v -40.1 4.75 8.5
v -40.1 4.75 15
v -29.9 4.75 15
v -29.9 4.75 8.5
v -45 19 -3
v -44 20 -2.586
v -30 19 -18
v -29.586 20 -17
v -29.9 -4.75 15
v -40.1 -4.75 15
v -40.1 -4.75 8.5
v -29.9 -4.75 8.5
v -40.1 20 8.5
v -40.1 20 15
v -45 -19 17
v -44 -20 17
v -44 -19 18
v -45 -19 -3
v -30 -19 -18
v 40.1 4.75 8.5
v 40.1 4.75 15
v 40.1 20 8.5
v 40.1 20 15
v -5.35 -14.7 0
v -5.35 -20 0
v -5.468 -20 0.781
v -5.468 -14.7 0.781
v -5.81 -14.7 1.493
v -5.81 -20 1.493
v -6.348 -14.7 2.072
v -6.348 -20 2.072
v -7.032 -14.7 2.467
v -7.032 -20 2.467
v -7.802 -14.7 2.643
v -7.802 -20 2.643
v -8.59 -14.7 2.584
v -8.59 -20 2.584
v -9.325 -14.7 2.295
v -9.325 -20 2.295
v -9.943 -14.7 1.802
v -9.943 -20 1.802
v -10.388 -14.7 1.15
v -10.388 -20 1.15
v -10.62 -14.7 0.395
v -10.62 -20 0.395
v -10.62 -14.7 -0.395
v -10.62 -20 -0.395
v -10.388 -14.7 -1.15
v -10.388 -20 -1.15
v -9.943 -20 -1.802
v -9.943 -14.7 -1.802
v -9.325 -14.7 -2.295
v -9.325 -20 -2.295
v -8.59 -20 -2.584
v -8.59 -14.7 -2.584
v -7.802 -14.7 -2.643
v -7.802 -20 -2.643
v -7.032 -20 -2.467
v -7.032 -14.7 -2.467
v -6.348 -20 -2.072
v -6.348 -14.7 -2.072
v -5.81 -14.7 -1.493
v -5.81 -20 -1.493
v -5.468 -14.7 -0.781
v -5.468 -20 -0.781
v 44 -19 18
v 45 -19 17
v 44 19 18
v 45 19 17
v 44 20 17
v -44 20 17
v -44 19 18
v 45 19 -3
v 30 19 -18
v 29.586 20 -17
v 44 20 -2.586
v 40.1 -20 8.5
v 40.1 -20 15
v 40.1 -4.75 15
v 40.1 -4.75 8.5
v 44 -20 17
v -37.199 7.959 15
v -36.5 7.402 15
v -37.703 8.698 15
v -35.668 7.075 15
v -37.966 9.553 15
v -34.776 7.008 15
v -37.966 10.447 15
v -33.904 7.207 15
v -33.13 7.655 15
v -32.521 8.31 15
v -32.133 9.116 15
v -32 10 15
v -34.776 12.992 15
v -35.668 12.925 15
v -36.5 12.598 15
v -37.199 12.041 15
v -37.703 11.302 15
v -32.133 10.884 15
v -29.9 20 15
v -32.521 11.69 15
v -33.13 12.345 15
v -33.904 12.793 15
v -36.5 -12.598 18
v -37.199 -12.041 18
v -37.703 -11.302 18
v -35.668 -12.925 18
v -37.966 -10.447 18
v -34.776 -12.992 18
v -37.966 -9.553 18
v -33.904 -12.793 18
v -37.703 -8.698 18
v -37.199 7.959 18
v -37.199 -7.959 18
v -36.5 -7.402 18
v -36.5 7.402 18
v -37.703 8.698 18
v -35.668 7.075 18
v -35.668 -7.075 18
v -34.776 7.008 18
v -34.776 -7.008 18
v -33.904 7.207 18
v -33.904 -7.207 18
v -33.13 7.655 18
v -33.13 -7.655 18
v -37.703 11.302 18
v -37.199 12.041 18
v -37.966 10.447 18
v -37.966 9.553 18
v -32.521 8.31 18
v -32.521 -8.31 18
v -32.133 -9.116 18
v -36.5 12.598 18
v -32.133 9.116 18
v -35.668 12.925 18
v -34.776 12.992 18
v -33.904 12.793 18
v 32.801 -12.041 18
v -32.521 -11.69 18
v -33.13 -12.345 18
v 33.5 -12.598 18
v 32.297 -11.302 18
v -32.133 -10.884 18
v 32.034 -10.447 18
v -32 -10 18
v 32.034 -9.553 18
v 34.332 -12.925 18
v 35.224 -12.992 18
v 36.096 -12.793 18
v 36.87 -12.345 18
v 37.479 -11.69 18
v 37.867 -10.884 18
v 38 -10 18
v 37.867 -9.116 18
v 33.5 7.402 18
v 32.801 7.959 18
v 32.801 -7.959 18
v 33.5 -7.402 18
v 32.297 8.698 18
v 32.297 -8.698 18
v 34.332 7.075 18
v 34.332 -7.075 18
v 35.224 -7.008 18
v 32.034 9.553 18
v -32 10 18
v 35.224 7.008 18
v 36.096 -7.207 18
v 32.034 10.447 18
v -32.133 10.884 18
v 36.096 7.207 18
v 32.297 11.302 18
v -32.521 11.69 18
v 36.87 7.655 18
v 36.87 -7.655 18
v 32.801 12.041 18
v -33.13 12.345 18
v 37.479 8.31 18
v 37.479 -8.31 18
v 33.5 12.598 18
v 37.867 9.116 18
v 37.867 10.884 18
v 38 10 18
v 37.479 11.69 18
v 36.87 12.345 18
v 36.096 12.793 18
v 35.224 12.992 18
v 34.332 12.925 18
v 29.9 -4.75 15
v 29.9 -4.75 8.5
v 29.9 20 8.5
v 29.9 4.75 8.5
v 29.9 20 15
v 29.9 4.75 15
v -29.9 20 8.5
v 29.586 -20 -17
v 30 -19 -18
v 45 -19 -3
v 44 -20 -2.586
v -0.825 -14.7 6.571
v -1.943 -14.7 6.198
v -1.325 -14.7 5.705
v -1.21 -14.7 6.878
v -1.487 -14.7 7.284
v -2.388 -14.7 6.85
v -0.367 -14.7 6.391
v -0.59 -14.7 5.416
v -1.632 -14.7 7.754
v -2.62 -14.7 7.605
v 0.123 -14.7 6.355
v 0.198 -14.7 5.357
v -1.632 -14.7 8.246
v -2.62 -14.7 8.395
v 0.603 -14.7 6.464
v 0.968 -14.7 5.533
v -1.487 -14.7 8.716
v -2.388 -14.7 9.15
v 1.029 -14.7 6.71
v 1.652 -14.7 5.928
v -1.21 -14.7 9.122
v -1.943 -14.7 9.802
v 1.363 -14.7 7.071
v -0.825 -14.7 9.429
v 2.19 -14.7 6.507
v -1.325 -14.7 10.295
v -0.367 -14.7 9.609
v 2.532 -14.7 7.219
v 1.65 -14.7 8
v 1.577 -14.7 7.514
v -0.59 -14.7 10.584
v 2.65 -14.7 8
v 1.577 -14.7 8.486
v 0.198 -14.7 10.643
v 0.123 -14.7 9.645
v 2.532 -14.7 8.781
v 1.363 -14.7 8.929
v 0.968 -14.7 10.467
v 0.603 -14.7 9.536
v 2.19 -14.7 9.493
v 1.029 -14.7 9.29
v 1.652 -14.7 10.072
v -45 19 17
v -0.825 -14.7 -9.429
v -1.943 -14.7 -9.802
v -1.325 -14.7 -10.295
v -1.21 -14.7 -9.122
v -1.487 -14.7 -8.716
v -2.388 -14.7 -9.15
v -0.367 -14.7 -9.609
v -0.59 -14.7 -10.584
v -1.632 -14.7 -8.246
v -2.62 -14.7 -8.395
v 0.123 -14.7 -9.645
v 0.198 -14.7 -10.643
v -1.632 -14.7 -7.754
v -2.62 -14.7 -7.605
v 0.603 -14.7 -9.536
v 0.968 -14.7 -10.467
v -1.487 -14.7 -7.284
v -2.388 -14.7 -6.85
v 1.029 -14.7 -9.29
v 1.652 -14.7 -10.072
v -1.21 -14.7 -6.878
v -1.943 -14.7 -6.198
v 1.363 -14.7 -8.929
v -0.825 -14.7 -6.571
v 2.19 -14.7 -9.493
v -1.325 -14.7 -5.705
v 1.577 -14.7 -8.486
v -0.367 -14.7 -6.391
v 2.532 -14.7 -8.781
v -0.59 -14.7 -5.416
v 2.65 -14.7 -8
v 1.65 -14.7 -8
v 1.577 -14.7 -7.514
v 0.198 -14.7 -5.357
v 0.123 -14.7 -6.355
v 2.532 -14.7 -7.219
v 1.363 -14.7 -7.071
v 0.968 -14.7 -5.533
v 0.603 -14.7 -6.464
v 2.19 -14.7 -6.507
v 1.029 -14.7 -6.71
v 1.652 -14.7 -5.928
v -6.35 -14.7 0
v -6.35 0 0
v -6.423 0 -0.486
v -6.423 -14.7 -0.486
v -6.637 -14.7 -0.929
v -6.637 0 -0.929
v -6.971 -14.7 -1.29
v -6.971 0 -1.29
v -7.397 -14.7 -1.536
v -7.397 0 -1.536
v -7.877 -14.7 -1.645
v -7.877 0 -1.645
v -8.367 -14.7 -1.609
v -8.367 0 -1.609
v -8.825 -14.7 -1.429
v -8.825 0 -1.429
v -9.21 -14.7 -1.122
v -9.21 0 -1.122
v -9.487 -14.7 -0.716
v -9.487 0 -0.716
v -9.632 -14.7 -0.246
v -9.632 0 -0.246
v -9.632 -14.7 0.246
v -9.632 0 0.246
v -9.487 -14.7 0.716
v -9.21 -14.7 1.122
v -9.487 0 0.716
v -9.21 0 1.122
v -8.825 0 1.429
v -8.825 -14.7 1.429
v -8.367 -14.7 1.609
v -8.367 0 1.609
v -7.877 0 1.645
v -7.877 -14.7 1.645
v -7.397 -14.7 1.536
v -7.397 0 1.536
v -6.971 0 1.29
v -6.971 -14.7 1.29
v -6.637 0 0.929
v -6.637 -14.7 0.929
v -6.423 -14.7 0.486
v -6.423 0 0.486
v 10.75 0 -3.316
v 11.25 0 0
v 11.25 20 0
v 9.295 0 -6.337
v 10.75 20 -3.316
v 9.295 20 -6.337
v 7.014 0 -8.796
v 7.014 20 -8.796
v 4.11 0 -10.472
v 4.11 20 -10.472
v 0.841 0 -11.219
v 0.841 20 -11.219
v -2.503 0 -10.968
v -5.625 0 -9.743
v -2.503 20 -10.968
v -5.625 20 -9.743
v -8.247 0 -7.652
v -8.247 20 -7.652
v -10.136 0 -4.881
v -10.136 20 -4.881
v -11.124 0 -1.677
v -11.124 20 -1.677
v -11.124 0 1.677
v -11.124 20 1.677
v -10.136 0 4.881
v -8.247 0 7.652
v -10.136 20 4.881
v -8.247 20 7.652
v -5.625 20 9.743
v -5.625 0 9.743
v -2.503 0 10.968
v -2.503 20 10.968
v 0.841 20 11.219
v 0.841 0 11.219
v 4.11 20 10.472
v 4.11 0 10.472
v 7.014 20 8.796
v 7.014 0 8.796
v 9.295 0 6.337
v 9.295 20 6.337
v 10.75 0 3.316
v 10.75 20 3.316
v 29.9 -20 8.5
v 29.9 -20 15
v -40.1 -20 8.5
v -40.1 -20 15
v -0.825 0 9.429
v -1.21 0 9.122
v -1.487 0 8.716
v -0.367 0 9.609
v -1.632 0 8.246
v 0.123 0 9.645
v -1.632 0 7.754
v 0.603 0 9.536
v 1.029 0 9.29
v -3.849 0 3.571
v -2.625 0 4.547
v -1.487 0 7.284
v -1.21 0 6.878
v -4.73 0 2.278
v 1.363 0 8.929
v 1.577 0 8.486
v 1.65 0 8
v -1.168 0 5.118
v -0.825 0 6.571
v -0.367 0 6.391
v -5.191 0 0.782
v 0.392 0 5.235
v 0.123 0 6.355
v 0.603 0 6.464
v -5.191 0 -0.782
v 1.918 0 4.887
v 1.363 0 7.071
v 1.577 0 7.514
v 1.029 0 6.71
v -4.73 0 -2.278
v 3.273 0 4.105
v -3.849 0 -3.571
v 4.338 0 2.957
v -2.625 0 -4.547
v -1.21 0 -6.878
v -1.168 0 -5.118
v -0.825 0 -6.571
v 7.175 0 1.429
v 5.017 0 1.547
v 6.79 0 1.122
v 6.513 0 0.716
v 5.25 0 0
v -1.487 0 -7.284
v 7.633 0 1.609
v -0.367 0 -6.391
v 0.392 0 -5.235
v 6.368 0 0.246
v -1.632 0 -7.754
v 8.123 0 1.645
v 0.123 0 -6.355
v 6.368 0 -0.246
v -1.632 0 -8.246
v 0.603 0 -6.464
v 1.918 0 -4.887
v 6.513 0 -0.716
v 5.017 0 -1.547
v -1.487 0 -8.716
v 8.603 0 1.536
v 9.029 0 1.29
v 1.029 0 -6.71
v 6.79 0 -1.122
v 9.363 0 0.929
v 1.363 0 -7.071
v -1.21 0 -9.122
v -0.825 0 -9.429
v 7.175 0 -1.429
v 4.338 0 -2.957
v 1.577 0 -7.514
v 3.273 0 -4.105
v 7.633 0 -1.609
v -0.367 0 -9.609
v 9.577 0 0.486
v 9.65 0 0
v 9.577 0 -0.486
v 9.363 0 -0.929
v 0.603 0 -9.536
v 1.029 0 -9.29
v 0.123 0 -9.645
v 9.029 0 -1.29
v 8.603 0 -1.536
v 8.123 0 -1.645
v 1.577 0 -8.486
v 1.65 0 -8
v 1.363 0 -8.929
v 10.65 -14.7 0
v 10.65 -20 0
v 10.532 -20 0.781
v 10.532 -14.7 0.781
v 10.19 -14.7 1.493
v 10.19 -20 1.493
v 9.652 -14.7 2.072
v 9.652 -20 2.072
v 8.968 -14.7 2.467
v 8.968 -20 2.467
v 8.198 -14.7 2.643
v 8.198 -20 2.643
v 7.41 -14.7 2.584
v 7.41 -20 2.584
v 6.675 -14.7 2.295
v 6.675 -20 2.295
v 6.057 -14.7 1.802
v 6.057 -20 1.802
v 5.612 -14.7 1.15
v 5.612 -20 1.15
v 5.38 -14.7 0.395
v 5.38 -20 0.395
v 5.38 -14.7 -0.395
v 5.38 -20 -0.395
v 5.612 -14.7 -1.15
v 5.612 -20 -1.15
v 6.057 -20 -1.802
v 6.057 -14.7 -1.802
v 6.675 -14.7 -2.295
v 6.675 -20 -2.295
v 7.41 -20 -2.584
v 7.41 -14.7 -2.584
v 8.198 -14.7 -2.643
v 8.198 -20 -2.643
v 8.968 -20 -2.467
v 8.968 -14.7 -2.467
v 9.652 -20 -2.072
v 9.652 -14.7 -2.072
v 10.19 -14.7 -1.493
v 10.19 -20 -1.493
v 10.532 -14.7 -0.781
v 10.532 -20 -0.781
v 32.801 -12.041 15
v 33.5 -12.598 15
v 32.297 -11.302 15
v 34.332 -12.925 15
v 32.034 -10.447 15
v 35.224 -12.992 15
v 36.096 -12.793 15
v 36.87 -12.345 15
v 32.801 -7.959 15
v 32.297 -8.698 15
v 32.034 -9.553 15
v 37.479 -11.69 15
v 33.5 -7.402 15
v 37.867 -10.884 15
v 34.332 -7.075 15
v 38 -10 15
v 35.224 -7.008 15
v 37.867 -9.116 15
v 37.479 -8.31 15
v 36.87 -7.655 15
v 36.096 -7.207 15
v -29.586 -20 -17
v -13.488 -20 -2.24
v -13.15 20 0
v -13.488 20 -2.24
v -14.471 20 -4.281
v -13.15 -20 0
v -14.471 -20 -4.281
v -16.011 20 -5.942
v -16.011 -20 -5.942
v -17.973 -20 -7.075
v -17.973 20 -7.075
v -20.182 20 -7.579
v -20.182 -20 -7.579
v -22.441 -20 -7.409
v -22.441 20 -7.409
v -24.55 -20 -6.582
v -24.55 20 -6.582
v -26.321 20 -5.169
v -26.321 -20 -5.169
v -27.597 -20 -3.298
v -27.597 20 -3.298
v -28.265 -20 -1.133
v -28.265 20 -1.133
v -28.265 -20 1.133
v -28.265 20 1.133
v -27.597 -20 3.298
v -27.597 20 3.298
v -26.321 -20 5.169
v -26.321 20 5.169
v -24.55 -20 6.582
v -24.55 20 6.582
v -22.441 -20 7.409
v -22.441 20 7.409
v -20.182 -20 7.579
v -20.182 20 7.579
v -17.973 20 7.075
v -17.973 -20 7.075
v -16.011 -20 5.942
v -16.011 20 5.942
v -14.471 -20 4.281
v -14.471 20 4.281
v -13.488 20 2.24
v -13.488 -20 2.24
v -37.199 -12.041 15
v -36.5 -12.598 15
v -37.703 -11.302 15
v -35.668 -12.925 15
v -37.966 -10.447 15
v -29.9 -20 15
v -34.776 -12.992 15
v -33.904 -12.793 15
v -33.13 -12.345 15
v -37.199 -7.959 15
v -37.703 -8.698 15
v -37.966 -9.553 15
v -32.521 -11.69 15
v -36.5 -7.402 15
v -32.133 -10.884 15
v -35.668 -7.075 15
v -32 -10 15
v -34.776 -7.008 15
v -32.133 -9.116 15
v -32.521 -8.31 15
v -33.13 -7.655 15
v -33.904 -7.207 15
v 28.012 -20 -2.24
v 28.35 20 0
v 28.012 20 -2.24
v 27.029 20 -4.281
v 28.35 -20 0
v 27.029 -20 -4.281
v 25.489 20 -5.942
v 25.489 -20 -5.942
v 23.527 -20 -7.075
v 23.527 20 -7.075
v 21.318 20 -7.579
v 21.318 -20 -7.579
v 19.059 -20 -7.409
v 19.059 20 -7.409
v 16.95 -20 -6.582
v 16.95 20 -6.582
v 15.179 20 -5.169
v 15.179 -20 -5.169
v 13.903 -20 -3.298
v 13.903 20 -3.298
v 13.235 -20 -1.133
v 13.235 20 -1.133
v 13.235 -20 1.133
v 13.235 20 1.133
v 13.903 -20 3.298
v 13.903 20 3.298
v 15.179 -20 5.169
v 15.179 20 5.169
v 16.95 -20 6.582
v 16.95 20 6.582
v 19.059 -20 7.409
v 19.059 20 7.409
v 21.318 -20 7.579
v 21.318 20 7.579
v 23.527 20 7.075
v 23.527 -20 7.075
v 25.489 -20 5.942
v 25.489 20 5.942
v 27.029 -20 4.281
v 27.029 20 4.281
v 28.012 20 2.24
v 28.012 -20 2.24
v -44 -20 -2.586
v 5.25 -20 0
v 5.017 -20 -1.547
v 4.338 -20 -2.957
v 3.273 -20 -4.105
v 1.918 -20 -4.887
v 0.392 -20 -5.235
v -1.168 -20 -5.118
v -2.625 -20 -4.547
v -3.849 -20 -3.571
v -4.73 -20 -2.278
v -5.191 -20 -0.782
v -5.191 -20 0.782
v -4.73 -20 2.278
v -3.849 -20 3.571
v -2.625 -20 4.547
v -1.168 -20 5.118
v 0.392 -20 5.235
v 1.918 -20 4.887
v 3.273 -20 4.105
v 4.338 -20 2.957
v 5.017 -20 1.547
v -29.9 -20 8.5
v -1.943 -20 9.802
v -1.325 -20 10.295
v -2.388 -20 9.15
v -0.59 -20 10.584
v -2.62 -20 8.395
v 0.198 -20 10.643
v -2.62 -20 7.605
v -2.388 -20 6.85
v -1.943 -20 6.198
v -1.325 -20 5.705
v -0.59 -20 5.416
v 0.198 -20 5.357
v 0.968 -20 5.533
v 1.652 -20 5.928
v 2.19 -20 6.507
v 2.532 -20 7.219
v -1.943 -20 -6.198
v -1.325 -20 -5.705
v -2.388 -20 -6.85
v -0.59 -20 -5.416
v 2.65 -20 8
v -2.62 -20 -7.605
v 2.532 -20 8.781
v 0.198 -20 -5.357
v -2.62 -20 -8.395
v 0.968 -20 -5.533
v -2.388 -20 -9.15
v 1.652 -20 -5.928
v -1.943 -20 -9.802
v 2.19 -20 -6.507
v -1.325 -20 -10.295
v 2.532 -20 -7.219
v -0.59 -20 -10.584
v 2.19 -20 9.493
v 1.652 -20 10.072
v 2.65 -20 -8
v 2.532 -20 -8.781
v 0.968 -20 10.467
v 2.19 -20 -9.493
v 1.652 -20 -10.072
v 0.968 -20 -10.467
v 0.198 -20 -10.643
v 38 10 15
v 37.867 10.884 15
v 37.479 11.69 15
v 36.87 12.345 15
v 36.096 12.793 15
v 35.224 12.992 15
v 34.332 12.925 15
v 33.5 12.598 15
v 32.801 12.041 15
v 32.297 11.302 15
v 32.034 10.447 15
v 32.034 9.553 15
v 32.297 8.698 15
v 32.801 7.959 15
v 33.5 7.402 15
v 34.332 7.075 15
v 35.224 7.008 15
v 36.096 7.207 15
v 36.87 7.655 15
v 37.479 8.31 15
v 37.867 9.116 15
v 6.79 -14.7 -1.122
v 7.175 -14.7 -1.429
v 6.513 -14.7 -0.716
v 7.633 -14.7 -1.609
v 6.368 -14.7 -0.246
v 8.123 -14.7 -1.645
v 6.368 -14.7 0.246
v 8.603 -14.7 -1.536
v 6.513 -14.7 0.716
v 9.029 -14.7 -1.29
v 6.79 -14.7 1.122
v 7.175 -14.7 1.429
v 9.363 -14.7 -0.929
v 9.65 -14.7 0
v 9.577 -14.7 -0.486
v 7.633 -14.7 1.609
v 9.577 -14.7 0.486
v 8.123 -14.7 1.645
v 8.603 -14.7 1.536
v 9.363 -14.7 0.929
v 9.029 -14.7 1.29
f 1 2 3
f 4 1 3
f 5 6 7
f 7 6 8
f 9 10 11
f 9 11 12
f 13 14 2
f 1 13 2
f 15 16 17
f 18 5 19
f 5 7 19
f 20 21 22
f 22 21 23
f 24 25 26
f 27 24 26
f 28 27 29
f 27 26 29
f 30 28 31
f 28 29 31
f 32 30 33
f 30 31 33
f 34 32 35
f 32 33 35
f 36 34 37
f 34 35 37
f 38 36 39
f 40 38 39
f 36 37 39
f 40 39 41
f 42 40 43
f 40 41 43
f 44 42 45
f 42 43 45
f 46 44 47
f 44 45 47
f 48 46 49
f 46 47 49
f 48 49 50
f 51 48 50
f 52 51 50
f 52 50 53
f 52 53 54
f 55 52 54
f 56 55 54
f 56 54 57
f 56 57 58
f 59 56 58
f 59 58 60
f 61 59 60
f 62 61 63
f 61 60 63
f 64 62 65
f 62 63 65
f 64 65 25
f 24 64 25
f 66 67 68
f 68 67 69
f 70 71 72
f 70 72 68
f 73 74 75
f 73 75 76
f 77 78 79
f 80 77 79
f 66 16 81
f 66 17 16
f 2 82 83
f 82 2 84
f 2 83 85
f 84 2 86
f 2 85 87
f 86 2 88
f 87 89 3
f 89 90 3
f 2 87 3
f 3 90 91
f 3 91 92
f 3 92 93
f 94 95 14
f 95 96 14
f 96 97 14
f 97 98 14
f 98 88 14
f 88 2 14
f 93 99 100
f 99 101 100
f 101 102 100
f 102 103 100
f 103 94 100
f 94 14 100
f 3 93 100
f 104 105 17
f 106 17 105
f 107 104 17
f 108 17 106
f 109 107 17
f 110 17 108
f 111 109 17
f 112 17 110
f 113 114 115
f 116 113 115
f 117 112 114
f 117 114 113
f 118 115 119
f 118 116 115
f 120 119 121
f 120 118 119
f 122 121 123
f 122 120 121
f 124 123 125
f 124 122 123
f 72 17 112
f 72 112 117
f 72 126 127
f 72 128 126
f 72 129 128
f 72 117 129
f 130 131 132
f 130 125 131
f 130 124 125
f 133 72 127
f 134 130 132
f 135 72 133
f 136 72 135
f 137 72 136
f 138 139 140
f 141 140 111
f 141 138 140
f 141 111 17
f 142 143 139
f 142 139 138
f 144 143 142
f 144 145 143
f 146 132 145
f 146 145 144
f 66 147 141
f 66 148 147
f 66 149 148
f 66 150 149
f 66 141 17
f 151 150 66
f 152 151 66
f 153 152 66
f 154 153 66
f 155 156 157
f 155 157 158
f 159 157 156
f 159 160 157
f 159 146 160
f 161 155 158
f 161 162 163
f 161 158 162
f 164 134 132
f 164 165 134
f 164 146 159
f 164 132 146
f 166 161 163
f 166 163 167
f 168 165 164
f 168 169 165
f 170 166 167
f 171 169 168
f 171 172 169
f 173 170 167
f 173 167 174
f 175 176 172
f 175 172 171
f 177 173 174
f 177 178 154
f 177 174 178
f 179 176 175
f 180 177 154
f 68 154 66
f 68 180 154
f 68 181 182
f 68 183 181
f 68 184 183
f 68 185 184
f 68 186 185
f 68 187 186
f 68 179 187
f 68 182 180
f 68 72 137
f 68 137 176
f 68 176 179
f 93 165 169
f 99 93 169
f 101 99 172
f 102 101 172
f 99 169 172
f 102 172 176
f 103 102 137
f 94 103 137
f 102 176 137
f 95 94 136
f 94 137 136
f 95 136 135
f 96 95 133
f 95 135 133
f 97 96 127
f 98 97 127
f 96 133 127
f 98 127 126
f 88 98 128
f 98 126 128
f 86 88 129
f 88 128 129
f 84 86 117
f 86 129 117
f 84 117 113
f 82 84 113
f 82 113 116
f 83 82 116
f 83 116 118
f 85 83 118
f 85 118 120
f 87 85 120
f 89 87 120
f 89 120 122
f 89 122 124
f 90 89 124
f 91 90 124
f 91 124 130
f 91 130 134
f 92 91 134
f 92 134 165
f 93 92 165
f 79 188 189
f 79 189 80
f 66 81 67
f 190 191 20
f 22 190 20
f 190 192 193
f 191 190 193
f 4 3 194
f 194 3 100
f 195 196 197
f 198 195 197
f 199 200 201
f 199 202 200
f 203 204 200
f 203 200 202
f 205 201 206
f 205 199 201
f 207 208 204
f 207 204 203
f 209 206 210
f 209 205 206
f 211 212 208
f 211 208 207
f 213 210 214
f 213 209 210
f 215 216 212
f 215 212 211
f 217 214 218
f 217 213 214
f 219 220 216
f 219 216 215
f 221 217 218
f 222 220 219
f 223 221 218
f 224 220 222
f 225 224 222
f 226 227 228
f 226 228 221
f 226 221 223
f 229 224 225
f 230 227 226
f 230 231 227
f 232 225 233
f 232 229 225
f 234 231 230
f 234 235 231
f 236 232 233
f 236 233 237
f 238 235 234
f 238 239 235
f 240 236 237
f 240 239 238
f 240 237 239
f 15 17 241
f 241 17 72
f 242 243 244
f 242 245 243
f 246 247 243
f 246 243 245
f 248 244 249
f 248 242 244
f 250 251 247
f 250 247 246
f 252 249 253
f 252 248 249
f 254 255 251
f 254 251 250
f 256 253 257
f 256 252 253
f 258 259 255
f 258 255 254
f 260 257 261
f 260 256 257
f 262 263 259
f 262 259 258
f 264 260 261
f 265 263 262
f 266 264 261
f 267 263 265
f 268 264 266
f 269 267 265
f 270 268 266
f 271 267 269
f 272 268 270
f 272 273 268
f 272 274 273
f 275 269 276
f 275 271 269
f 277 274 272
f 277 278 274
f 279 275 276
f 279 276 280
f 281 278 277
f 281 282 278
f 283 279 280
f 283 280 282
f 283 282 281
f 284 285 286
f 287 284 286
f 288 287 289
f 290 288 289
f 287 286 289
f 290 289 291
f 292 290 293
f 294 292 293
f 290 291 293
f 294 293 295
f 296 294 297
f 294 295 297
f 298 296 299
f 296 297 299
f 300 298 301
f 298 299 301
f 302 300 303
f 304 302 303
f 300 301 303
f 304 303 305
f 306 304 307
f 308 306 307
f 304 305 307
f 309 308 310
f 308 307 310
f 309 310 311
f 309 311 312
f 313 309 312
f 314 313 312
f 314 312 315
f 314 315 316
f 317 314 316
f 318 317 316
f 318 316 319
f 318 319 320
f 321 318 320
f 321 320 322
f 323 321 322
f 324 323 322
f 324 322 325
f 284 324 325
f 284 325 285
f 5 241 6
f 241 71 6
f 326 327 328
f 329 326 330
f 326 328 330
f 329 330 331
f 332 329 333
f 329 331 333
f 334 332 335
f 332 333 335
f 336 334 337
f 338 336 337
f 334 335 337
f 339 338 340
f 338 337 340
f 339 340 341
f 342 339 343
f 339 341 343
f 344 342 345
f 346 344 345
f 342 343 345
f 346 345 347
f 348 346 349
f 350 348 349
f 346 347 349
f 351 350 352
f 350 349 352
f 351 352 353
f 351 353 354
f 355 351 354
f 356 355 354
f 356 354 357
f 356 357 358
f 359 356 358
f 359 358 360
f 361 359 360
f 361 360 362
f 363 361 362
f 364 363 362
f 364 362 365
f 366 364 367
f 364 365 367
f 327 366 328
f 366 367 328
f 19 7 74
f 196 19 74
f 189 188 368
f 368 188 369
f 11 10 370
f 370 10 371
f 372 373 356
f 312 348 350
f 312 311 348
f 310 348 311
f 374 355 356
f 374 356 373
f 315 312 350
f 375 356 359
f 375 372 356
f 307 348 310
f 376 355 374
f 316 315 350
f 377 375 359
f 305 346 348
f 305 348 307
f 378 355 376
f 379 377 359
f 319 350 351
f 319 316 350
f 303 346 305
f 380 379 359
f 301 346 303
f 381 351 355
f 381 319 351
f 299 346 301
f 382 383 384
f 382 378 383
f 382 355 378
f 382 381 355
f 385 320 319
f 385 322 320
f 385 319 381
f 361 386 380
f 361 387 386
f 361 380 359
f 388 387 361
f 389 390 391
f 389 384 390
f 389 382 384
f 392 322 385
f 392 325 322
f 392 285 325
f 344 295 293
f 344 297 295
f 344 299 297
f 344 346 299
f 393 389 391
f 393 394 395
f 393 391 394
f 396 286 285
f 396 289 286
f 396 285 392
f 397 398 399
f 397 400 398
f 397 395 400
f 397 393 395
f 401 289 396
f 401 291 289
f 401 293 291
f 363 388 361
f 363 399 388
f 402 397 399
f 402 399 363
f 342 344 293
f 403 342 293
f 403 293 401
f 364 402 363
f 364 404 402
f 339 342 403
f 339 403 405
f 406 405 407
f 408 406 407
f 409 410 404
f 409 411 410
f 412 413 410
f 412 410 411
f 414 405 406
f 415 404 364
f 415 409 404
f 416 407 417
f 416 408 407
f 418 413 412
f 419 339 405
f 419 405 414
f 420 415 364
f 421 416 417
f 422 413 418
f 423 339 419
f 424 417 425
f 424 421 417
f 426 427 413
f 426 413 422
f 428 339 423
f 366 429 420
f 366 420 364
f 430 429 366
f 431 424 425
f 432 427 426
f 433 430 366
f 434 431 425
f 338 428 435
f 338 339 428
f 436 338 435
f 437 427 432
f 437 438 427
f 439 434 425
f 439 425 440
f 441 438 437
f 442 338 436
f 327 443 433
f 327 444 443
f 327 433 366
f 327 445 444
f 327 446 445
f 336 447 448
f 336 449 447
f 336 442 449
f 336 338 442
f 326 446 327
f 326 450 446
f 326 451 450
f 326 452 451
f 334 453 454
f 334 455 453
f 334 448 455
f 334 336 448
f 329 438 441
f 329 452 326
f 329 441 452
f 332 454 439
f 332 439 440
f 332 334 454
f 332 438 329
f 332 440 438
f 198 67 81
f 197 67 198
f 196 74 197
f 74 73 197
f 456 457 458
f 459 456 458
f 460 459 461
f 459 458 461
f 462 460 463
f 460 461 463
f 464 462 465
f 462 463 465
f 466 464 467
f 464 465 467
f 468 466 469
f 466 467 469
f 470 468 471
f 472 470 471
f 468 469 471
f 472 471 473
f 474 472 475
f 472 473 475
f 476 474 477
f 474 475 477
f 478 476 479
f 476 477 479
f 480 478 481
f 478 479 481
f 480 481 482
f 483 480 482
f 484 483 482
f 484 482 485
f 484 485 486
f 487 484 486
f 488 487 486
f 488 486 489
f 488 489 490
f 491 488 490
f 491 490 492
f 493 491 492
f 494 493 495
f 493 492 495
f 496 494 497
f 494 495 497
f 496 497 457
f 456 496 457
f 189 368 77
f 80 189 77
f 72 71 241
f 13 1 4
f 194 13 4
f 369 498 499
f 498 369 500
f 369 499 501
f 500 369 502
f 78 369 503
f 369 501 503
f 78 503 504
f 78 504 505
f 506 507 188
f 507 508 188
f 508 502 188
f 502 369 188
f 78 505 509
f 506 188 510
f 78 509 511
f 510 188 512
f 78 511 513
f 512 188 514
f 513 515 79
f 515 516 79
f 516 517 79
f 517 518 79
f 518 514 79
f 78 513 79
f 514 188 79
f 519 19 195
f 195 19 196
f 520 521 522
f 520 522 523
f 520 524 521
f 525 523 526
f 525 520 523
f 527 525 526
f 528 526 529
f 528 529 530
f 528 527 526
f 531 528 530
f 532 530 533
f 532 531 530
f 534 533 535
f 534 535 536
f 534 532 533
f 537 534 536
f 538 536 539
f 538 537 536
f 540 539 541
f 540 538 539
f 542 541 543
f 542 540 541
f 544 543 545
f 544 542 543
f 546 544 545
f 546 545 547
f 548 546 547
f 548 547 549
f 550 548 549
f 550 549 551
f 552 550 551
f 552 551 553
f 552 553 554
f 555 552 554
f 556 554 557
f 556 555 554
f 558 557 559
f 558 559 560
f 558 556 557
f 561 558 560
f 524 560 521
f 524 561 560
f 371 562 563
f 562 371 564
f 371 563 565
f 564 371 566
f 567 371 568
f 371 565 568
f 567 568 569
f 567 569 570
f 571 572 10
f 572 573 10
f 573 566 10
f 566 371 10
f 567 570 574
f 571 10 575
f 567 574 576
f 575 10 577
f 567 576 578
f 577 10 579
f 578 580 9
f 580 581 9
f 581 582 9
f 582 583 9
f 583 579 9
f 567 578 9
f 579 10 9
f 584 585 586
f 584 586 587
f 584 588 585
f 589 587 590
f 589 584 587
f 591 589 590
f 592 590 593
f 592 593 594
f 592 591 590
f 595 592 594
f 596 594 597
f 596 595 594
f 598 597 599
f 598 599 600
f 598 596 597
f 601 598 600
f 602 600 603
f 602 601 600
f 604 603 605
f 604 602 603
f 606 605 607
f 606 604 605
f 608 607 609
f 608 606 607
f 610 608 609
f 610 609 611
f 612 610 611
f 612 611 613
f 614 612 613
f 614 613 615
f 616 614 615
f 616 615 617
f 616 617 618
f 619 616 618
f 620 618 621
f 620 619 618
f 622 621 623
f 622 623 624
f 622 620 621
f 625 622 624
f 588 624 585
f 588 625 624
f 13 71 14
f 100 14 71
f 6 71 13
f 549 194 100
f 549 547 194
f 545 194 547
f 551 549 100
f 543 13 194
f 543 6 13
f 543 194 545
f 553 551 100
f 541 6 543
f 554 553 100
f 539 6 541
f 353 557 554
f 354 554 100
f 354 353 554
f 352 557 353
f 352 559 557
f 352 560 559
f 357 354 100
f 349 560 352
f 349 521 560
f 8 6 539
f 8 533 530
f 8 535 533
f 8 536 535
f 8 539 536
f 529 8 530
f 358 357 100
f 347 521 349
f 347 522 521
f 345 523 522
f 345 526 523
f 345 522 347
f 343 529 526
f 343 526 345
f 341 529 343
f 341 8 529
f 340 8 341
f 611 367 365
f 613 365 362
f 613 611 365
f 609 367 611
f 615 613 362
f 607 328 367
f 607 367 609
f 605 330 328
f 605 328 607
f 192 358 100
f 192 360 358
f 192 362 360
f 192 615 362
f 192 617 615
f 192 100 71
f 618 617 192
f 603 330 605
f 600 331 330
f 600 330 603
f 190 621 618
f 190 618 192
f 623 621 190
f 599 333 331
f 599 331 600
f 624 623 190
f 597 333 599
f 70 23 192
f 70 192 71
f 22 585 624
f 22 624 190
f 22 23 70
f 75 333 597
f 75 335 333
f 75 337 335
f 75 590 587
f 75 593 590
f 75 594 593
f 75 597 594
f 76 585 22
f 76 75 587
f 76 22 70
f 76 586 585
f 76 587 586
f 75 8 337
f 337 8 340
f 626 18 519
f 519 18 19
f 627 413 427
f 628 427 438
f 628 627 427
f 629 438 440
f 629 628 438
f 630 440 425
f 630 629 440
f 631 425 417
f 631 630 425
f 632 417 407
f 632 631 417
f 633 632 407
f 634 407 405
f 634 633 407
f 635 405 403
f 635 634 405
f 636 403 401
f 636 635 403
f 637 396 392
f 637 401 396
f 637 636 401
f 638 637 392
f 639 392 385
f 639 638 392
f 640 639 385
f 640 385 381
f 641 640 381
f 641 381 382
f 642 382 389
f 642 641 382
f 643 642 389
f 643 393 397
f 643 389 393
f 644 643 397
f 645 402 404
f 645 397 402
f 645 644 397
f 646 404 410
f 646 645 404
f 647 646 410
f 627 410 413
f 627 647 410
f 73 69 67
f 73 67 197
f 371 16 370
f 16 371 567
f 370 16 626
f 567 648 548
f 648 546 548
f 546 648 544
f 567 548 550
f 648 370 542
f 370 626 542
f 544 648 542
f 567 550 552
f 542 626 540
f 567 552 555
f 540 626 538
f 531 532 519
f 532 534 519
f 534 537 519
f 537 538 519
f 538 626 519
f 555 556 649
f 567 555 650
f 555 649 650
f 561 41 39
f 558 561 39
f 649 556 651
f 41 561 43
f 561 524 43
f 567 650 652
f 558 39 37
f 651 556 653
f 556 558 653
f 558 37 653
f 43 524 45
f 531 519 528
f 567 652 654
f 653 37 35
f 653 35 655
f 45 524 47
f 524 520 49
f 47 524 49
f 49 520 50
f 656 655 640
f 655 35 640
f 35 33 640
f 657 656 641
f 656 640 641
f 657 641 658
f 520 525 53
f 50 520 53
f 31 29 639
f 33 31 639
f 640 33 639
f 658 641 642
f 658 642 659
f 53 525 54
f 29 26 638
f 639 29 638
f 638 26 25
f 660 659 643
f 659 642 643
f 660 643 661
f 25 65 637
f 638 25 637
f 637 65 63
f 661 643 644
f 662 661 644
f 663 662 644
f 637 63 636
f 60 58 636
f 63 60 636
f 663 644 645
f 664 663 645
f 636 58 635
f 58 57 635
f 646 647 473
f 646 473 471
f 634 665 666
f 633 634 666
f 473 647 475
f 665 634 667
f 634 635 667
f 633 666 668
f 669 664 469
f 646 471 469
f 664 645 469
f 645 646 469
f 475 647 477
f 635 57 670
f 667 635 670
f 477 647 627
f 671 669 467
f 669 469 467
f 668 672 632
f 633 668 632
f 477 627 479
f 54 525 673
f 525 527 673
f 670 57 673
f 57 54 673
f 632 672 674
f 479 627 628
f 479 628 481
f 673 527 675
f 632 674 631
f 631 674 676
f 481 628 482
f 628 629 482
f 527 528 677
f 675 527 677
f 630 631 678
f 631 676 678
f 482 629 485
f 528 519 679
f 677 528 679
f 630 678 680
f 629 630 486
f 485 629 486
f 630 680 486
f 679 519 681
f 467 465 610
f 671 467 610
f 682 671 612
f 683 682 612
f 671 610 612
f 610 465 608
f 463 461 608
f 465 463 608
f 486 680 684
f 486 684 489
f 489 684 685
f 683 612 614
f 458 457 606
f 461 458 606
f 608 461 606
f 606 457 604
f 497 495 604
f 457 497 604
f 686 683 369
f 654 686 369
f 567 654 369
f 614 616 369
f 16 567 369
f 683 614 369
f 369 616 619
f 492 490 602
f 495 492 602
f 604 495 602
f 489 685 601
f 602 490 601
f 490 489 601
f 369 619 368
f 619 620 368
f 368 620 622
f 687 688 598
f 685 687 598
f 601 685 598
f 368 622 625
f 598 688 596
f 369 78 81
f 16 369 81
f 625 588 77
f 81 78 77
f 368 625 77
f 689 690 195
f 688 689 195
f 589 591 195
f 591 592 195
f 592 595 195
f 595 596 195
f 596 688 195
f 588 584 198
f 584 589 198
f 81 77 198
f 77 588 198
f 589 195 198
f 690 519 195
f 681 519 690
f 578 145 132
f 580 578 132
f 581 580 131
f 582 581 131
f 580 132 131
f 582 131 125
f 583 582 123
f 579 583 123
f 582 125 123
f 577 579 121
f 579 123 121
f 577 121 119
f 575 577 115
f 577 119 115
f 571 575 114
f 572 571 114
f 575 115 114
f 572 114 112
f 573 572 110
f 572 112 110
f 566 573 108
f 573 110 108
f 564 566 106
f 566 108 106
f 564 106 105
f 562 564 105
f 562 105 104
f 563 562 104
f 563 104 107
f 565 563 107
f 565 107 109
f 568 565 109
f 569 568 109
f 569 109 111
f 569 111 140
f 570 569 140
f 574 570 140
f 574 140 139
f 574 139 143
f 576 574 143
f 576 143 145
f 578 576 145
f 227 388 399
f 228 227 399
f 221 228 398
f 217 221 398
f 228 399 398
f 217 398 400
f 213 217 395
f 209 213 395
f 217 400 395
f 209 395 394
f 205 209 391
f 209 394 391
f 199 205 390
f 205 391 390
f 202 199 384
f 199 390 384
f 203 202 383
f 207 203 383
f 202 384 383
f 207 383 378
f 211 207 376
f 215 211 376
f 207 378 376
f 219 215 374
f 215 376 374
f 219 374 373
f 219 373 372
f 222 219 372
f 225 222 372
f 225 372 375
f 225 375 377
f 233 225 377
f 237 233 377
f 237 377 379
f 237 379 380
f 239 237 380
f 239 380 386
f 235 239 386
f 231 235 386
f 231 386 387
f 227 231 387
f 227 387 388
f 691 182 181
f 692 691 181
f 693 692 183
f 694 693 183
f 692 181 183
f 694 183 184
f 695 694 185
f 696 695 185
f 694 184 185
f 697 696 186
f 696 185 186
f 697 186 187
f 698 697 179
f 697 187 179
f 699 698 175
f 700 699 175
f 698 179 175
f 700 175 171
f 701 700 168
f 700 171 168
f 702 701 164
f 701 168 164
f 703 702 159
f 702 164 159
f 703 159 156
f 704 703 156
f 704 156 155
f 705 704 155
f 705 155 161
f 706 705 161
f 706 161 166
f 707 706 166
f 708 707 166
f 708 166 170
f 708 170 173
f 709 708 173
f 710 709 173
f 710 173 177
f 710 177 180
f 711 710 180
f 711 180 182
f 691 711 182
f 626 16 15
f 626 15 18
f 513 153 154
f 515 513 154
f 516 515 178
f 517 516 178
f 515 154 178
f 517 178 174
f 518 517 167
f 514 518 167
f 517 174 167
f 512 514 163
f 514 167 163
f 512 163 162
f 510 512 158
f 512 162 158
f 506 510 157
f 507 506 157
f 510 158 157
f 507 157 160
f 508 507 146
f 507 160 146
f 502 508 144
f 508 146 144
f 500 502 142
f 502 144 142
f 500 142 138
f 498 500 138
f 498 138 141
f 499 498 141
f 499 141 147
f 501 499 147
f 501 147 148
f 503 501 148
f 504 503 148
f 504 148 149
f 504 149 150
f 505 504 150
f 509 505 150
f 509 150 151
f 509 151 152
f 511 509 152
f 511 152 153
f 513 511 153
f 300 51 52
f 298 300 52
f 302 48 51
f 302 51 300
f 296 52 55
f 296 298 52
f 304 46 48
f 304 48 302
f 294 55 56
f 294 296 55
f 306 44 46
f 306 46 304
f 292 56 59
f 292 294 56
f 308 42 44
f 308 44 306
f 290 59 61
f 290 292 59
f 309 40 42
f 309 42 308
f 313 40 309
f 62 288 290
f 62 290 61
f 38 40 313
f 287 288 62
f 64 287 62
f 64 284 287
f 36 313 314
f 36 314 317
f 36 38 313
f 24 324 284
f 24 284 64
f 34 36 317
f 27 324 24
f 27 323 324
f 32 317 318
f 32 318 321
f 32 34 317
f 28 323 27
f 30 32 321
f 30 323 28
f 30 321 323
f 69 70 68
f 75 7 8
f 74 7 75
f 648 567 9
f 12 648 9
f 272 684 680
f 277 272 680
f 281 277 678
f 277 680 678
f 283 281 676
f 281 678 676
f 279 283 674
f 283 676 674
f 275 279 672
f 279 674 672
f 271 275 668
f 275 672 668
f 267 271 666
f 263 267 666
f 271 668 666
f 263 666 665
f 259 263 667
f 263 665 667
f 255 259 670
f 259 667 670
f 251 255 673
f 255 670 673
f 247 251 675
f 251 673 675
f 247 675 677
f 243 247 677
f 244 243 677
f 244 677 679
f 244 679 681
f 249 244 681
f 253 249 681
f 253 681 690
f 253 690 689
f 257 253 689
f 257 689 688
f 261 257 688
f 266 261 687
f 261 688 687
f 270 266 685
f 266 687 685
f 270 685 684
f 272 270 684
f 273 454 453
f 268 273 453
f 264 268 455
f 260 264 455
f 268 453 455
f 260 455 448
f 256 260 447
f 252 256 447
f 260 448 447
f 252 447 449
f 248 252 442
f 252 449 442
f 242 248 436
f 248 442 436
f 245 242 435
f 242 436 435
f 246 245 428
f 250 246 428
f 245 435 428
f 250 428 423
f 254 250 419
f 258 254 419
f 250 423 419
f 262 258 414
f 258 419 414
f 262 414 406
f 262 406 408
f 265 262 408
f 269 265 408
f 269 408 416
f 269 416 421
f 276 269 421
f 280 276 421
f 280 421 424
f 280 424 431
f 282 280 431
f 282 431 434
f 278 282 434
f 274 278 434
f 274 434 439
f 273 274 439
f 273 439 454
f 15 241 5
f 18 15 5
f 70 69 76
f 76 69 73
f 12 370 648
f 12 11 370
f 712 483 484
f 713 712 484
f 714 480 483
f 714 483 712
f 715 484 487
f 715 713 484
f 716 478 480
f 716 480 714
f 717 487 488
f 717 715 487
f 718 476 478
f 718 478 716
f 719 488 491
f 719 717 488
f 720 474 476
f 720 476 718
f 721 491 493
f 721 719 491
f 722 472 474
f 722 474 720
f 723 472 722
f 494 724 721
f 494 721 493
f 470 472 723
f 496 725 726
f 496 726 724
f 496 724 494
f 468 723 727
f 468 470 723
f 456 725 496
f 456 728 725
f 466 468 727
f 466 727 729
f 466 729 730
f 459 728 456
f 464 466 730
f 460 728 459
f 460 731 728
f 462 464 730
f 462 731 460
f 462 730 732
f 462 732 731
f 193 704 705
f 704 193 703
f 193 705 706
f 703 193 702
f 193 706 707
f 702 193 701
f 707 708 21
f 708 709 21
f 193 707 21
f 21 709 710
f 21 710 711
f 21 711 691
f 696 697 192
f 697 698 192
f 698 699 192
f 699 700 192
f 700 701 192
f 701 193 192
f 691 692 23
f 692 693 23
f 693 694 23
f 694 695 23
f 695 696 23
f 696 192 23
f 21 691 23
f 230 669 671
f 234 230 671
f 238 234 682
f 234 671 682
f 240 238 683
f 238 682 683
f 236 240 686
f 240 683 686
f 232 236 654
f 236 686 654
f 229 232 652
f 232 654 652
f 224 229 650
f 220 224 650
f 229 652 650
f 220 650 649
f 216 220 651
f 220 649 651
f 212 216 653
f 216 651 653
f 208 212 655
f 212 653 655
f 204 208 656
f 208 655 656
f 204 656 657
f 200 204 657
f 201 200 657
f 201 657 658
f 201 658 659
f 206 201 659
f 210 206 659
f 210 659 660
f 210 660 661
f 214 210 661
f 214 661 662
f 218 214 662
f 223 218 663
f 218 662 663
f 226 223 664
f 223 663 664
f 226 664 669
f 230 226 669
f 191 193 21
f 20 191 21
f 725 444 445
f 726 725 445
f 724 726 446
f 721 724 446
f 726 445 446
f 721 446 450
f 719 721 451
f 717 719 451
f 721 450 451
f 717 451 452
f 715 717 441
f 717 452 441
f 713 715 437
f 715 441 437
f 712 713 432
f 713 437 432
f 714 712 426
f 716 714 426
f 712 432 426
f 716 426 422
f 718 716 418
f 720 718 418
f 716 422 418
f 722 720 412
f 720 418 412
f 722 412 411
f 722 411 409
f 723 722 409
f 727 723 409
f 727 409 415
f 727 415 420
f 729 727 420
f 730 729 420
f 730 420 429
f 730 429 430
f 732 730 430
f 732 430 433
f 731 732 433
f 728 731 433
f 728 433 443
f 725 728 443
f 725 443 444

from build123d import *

# Parameters (mm, degrees)
SKETCH1_W           = 90
SKETCH1_H           = 36
SKETCH1_R           = 5.25
SKETCH1_R_2         = 7.6
BOSS_EXTRUDE1_DEPTH = 20
SKETCH2_R           = 11.25
CUT_EXTRUDE1_DEPTH  = 20
CHAMFER1_SIZE       = 15
CUT_EXTRUDE2_REACH  = 22
SKETCH4_R           = 1.65
SKETCH11_R          = 2.65
CUT_EXTRUDE7_DEPTH  = 5.3
SKETCH12_R          = 3
CUT_EXTRUDE8_DEPTH  = 5
CUT_EXTRUDE10_START = -3
SKETCH14_W          = 10.2
SKETCH14_H          = 10.5
SKETCH14_R          = 3
SKETCH14_H_2        = 4.75
CUT_EXTRUDE10_DEPTH = 6.5
CHAMFER2_SIZE       = 1


with BuildPart() as part:
    # Sketch1 → Boss-Extrude1 (new body, symmetric)
    with BuildSketch(Plane(origin=(0, 0, 0), x_dir=(1, 0, 0), z_dir=(0, 1, 0))):
        Rectangle(SKETCH1_W, SKETCH1_H)
        Circle(SKETCH1_R, mode=Mode.SUBTRACT)
        with Locations((-20.75, 0)):
            Circle(SKETCH1_R_2, mode=Mode.SUBTRACT)
        with Locations((20.75, 0)):
            Circle(SKETCH1_R_2, mode=Mode.SUBTRACT)
    extrude(amount=BOSS_EXTRUDE1_DEPTH, both=True)

    # Sketch2 → Cut-Extrude1 (cut)
    with BuildSketch(Plane(origin=(0, 20, 0), x_dir=(1, 0, 0), z_dir=(0, 1, 0))):
        Circle(SKETCH2_R)
    extrude(amount=-CUT_EXTRUDE1_DEPTH, mode=Mode.SUBTRACT)

    # Chamfer1
    chamfer1_edges = [part.edges().sort_by_distance(p)[0] for p in [
        (-45, 0, -18),
        (45, 0, -18),
    ]]
    chamfer(chamfer1_edges, length=CHAMFER1_SIZE)

    # Sketch4 → Cut-Extrude2 (cut, up to next)
    with BuildSketch(Plane(origin=(0, 0, 0), x_dir=(1, 0, 0), z_dir=(0, 1, 0)), mode=Mode.PRIVATE) as cut_extrude2_sk1:
        with Locations((0, 8)):
            Circle(SKETCH4_R)
    cut_extrude2_tool1 = extrude(cut_extrude2_sk1.sketch, amount=-CUT_EXTRUDE2_REACH, mode=Mode.PRIVATE) & part.part
    add(cut_extrude2_tool1.solids().sort_by_distance((0, 0, -8))[0], mode=Mode.SUBTRACT)
    # Sketch4 → Cut-Extrude2 (cut, up to next)
    with BuildSketch(Plane(origin=(0, 0, 0), x_dir=(1, 0, 0), z_dir=(0, 1, 0)), mode=Mode.PRIVATE) as cut_extrude2_sk2:
        with Locations((8, 0)):
            Circle(SKETCH4_R)
    cut_extrude2_tool2 = extrude(cut_extrude2_sk2.sketch, amount=-CUT_EXTRUDE2_REACH, mode=Mode.PRIVATE) & part.part
    add(cut_extrude2_tool2.solids().sort_by_distance((8, 0, 0))[0], mode=Mode.SUBTRACT)
    # Sketch4 → Cut-Extrude2 (cut, up to next)
    with BuildSketch(Plane(origin=(0, 0, 0), x_dir=(1, 0, 0), z_dir=(0, 1, 0)), mode=Mode.PRIVATE) as cut_extrude2_sk3:
        with Locations((0, -8)):
            Circle(SKETCH4_R)
    cut_extrude2_tool3 = extrude(cut_extrude2_sk3.sketch, amount=-CUT_EXTRUDE2_REACH, mode=Mode.PRIVATE) & part.part
    add(cut_extrude2_tool3.solids().sort_by_distance((0, 0, 8))[0], mode=Mode.SUBTRACT)
    # Sketch4 → Cut-Extrude2 (cut, up to next)
    with BuildSketch(Plane(origin=(0, 0, 0), x_dir=(1, 0, 0), z_dir=(0, 1, 0)), mode=Mode.PRIVATE) as cut_extrude2_sk4:
        with Locations((-8, 0)):
            Circle(SKETCH4_R)
    cut_extrude2_tool4 = extrude(cut_extrude2_sk4.sketch, amount=-CUT_EXTRUDE2_REACH, mode=Mode.PRIVATE) & part.part
    add(cut_extrude2_tool4.solids().sort_by_distance((-8, 0, 0))[0], mode=Mode.SUBTRACT)

    # Sketch11 → Cut-Extrude7 (cut)
    with BuildSketch(Plane.XZ.offset(20)):
        with Locations((-8, 0)):
            Circle(SKETCH11_R)
        with Locations((0, 8)):
            Circle(SKETCH11_R)
        with Locations((8, 0)):
            Circle(SKETCH11_R)
        with Locations((0, -8)):
            Circle(SKETCH11_R)
    extrude(amount=-CUT_EXTRUDE7_DEPTH, mode=Mode.SUBTRACT)

    # Sketch12 → Cut-Extrude8 (cut)
    with BuildSketch(Plane.XY.offset(18)):
        with Locations((-35, 10)):
            Circle(SKETCH12_R)
        with Locations((-35, -10)):
            Circle(SKETCH12_R)
        with Locations((35, -10)):
            Circle(SKETCH12_R)
        with Locations((35, 10)):
            Circle(SKETCH12_R)
    extrude(amount=-CUT_EXTRUDE8_DEPTH, mode=Mode.SUBTRACT)

    # Sketch14 → Cut-Extrude10 (cut)
    with BuildSketch(Plane.XY.offset(18).offset(CUT_EXTRUDE10_START)):
        with Locations((-35, 10)):
            Rectangle(SKETCH14_W, SKETCH14_H)
        with Locations((-35, 10)):
            Circle(SKETCH14_R, mode=Mode.SUBTRACT)
        with Locations((-35, 17.625)):
            Rectangle(SKETCH14_W, SKETCH14_H_2)
        with Locations((-35, -17.625)):
            Rectangle(SKETCH14_W, SKETCH14_H_2)
        with Locations((-35, -10)):
            Rectangle(SKETCH14_W, SKETCH14_H)
        with Locations((-35, -10)):
            Circle(SKETCH14_R, mode=Mode.SUBTRACT)
        with Locations((35, -10)):
            Rectangle(SKETCH14_W, SKETCH14_H)
        with Locations((35, -10)):
            Circle(SKETCH14_R, mode=Mode.SUBTRACT)
        with Locations((35, -17.625)):
            Rectangle(SKETCH14_W, SKETCH14_H_2)
        with Locations((35, 10)):
            Rectangle(SKETCH14_W, SKETCH14_H)
        with Locations((35, 10)):
            Circle(SKETCH14_R, mode=Mode.SUBTRACT)
        with Locations((35, 17.625)):
            Rectangle(SKETCH14_W, SKETCH14_H_2)
        with Locations((-35, -10)):
            Circle(SKETCH14_R)
        with Locations((35, -10)):
            Circle(SKETCH14_R)
        with Locations((35, 10)):
            Circle(SKETCH14_R)
        with Locations((-35, 10)):
            Circle(SKETCH14_R)
    extrude(amount=-CUT_EXTRUDE10_DEPTH, mode=Mode.SUBTRACT)

    # Chamfer2
    chamfer2_edges = [part.edges().sort_by_distance(p)[0] for p in [
        (0, -20, 18),
        (0, 20, -18),
        (-45, 20, 7.5),
        (-37.5, 20, -10.5),
        (37.5, 20, -10.5),
        (0, -20, -18),
        (-45, -20, 7.5),
        (-37.5, -20, -10.5),
        (37.5, -20, -10.5),
        (45, -20, 7.5),
        (0, 20, 18),
        (45, 20, 7.5),
        (45, 0, 18),
        (-45, 0, 18),
    ]]
    chamfer(chamfer2_edges, length=CHAMFER2_SIZE)


solid = part.part
